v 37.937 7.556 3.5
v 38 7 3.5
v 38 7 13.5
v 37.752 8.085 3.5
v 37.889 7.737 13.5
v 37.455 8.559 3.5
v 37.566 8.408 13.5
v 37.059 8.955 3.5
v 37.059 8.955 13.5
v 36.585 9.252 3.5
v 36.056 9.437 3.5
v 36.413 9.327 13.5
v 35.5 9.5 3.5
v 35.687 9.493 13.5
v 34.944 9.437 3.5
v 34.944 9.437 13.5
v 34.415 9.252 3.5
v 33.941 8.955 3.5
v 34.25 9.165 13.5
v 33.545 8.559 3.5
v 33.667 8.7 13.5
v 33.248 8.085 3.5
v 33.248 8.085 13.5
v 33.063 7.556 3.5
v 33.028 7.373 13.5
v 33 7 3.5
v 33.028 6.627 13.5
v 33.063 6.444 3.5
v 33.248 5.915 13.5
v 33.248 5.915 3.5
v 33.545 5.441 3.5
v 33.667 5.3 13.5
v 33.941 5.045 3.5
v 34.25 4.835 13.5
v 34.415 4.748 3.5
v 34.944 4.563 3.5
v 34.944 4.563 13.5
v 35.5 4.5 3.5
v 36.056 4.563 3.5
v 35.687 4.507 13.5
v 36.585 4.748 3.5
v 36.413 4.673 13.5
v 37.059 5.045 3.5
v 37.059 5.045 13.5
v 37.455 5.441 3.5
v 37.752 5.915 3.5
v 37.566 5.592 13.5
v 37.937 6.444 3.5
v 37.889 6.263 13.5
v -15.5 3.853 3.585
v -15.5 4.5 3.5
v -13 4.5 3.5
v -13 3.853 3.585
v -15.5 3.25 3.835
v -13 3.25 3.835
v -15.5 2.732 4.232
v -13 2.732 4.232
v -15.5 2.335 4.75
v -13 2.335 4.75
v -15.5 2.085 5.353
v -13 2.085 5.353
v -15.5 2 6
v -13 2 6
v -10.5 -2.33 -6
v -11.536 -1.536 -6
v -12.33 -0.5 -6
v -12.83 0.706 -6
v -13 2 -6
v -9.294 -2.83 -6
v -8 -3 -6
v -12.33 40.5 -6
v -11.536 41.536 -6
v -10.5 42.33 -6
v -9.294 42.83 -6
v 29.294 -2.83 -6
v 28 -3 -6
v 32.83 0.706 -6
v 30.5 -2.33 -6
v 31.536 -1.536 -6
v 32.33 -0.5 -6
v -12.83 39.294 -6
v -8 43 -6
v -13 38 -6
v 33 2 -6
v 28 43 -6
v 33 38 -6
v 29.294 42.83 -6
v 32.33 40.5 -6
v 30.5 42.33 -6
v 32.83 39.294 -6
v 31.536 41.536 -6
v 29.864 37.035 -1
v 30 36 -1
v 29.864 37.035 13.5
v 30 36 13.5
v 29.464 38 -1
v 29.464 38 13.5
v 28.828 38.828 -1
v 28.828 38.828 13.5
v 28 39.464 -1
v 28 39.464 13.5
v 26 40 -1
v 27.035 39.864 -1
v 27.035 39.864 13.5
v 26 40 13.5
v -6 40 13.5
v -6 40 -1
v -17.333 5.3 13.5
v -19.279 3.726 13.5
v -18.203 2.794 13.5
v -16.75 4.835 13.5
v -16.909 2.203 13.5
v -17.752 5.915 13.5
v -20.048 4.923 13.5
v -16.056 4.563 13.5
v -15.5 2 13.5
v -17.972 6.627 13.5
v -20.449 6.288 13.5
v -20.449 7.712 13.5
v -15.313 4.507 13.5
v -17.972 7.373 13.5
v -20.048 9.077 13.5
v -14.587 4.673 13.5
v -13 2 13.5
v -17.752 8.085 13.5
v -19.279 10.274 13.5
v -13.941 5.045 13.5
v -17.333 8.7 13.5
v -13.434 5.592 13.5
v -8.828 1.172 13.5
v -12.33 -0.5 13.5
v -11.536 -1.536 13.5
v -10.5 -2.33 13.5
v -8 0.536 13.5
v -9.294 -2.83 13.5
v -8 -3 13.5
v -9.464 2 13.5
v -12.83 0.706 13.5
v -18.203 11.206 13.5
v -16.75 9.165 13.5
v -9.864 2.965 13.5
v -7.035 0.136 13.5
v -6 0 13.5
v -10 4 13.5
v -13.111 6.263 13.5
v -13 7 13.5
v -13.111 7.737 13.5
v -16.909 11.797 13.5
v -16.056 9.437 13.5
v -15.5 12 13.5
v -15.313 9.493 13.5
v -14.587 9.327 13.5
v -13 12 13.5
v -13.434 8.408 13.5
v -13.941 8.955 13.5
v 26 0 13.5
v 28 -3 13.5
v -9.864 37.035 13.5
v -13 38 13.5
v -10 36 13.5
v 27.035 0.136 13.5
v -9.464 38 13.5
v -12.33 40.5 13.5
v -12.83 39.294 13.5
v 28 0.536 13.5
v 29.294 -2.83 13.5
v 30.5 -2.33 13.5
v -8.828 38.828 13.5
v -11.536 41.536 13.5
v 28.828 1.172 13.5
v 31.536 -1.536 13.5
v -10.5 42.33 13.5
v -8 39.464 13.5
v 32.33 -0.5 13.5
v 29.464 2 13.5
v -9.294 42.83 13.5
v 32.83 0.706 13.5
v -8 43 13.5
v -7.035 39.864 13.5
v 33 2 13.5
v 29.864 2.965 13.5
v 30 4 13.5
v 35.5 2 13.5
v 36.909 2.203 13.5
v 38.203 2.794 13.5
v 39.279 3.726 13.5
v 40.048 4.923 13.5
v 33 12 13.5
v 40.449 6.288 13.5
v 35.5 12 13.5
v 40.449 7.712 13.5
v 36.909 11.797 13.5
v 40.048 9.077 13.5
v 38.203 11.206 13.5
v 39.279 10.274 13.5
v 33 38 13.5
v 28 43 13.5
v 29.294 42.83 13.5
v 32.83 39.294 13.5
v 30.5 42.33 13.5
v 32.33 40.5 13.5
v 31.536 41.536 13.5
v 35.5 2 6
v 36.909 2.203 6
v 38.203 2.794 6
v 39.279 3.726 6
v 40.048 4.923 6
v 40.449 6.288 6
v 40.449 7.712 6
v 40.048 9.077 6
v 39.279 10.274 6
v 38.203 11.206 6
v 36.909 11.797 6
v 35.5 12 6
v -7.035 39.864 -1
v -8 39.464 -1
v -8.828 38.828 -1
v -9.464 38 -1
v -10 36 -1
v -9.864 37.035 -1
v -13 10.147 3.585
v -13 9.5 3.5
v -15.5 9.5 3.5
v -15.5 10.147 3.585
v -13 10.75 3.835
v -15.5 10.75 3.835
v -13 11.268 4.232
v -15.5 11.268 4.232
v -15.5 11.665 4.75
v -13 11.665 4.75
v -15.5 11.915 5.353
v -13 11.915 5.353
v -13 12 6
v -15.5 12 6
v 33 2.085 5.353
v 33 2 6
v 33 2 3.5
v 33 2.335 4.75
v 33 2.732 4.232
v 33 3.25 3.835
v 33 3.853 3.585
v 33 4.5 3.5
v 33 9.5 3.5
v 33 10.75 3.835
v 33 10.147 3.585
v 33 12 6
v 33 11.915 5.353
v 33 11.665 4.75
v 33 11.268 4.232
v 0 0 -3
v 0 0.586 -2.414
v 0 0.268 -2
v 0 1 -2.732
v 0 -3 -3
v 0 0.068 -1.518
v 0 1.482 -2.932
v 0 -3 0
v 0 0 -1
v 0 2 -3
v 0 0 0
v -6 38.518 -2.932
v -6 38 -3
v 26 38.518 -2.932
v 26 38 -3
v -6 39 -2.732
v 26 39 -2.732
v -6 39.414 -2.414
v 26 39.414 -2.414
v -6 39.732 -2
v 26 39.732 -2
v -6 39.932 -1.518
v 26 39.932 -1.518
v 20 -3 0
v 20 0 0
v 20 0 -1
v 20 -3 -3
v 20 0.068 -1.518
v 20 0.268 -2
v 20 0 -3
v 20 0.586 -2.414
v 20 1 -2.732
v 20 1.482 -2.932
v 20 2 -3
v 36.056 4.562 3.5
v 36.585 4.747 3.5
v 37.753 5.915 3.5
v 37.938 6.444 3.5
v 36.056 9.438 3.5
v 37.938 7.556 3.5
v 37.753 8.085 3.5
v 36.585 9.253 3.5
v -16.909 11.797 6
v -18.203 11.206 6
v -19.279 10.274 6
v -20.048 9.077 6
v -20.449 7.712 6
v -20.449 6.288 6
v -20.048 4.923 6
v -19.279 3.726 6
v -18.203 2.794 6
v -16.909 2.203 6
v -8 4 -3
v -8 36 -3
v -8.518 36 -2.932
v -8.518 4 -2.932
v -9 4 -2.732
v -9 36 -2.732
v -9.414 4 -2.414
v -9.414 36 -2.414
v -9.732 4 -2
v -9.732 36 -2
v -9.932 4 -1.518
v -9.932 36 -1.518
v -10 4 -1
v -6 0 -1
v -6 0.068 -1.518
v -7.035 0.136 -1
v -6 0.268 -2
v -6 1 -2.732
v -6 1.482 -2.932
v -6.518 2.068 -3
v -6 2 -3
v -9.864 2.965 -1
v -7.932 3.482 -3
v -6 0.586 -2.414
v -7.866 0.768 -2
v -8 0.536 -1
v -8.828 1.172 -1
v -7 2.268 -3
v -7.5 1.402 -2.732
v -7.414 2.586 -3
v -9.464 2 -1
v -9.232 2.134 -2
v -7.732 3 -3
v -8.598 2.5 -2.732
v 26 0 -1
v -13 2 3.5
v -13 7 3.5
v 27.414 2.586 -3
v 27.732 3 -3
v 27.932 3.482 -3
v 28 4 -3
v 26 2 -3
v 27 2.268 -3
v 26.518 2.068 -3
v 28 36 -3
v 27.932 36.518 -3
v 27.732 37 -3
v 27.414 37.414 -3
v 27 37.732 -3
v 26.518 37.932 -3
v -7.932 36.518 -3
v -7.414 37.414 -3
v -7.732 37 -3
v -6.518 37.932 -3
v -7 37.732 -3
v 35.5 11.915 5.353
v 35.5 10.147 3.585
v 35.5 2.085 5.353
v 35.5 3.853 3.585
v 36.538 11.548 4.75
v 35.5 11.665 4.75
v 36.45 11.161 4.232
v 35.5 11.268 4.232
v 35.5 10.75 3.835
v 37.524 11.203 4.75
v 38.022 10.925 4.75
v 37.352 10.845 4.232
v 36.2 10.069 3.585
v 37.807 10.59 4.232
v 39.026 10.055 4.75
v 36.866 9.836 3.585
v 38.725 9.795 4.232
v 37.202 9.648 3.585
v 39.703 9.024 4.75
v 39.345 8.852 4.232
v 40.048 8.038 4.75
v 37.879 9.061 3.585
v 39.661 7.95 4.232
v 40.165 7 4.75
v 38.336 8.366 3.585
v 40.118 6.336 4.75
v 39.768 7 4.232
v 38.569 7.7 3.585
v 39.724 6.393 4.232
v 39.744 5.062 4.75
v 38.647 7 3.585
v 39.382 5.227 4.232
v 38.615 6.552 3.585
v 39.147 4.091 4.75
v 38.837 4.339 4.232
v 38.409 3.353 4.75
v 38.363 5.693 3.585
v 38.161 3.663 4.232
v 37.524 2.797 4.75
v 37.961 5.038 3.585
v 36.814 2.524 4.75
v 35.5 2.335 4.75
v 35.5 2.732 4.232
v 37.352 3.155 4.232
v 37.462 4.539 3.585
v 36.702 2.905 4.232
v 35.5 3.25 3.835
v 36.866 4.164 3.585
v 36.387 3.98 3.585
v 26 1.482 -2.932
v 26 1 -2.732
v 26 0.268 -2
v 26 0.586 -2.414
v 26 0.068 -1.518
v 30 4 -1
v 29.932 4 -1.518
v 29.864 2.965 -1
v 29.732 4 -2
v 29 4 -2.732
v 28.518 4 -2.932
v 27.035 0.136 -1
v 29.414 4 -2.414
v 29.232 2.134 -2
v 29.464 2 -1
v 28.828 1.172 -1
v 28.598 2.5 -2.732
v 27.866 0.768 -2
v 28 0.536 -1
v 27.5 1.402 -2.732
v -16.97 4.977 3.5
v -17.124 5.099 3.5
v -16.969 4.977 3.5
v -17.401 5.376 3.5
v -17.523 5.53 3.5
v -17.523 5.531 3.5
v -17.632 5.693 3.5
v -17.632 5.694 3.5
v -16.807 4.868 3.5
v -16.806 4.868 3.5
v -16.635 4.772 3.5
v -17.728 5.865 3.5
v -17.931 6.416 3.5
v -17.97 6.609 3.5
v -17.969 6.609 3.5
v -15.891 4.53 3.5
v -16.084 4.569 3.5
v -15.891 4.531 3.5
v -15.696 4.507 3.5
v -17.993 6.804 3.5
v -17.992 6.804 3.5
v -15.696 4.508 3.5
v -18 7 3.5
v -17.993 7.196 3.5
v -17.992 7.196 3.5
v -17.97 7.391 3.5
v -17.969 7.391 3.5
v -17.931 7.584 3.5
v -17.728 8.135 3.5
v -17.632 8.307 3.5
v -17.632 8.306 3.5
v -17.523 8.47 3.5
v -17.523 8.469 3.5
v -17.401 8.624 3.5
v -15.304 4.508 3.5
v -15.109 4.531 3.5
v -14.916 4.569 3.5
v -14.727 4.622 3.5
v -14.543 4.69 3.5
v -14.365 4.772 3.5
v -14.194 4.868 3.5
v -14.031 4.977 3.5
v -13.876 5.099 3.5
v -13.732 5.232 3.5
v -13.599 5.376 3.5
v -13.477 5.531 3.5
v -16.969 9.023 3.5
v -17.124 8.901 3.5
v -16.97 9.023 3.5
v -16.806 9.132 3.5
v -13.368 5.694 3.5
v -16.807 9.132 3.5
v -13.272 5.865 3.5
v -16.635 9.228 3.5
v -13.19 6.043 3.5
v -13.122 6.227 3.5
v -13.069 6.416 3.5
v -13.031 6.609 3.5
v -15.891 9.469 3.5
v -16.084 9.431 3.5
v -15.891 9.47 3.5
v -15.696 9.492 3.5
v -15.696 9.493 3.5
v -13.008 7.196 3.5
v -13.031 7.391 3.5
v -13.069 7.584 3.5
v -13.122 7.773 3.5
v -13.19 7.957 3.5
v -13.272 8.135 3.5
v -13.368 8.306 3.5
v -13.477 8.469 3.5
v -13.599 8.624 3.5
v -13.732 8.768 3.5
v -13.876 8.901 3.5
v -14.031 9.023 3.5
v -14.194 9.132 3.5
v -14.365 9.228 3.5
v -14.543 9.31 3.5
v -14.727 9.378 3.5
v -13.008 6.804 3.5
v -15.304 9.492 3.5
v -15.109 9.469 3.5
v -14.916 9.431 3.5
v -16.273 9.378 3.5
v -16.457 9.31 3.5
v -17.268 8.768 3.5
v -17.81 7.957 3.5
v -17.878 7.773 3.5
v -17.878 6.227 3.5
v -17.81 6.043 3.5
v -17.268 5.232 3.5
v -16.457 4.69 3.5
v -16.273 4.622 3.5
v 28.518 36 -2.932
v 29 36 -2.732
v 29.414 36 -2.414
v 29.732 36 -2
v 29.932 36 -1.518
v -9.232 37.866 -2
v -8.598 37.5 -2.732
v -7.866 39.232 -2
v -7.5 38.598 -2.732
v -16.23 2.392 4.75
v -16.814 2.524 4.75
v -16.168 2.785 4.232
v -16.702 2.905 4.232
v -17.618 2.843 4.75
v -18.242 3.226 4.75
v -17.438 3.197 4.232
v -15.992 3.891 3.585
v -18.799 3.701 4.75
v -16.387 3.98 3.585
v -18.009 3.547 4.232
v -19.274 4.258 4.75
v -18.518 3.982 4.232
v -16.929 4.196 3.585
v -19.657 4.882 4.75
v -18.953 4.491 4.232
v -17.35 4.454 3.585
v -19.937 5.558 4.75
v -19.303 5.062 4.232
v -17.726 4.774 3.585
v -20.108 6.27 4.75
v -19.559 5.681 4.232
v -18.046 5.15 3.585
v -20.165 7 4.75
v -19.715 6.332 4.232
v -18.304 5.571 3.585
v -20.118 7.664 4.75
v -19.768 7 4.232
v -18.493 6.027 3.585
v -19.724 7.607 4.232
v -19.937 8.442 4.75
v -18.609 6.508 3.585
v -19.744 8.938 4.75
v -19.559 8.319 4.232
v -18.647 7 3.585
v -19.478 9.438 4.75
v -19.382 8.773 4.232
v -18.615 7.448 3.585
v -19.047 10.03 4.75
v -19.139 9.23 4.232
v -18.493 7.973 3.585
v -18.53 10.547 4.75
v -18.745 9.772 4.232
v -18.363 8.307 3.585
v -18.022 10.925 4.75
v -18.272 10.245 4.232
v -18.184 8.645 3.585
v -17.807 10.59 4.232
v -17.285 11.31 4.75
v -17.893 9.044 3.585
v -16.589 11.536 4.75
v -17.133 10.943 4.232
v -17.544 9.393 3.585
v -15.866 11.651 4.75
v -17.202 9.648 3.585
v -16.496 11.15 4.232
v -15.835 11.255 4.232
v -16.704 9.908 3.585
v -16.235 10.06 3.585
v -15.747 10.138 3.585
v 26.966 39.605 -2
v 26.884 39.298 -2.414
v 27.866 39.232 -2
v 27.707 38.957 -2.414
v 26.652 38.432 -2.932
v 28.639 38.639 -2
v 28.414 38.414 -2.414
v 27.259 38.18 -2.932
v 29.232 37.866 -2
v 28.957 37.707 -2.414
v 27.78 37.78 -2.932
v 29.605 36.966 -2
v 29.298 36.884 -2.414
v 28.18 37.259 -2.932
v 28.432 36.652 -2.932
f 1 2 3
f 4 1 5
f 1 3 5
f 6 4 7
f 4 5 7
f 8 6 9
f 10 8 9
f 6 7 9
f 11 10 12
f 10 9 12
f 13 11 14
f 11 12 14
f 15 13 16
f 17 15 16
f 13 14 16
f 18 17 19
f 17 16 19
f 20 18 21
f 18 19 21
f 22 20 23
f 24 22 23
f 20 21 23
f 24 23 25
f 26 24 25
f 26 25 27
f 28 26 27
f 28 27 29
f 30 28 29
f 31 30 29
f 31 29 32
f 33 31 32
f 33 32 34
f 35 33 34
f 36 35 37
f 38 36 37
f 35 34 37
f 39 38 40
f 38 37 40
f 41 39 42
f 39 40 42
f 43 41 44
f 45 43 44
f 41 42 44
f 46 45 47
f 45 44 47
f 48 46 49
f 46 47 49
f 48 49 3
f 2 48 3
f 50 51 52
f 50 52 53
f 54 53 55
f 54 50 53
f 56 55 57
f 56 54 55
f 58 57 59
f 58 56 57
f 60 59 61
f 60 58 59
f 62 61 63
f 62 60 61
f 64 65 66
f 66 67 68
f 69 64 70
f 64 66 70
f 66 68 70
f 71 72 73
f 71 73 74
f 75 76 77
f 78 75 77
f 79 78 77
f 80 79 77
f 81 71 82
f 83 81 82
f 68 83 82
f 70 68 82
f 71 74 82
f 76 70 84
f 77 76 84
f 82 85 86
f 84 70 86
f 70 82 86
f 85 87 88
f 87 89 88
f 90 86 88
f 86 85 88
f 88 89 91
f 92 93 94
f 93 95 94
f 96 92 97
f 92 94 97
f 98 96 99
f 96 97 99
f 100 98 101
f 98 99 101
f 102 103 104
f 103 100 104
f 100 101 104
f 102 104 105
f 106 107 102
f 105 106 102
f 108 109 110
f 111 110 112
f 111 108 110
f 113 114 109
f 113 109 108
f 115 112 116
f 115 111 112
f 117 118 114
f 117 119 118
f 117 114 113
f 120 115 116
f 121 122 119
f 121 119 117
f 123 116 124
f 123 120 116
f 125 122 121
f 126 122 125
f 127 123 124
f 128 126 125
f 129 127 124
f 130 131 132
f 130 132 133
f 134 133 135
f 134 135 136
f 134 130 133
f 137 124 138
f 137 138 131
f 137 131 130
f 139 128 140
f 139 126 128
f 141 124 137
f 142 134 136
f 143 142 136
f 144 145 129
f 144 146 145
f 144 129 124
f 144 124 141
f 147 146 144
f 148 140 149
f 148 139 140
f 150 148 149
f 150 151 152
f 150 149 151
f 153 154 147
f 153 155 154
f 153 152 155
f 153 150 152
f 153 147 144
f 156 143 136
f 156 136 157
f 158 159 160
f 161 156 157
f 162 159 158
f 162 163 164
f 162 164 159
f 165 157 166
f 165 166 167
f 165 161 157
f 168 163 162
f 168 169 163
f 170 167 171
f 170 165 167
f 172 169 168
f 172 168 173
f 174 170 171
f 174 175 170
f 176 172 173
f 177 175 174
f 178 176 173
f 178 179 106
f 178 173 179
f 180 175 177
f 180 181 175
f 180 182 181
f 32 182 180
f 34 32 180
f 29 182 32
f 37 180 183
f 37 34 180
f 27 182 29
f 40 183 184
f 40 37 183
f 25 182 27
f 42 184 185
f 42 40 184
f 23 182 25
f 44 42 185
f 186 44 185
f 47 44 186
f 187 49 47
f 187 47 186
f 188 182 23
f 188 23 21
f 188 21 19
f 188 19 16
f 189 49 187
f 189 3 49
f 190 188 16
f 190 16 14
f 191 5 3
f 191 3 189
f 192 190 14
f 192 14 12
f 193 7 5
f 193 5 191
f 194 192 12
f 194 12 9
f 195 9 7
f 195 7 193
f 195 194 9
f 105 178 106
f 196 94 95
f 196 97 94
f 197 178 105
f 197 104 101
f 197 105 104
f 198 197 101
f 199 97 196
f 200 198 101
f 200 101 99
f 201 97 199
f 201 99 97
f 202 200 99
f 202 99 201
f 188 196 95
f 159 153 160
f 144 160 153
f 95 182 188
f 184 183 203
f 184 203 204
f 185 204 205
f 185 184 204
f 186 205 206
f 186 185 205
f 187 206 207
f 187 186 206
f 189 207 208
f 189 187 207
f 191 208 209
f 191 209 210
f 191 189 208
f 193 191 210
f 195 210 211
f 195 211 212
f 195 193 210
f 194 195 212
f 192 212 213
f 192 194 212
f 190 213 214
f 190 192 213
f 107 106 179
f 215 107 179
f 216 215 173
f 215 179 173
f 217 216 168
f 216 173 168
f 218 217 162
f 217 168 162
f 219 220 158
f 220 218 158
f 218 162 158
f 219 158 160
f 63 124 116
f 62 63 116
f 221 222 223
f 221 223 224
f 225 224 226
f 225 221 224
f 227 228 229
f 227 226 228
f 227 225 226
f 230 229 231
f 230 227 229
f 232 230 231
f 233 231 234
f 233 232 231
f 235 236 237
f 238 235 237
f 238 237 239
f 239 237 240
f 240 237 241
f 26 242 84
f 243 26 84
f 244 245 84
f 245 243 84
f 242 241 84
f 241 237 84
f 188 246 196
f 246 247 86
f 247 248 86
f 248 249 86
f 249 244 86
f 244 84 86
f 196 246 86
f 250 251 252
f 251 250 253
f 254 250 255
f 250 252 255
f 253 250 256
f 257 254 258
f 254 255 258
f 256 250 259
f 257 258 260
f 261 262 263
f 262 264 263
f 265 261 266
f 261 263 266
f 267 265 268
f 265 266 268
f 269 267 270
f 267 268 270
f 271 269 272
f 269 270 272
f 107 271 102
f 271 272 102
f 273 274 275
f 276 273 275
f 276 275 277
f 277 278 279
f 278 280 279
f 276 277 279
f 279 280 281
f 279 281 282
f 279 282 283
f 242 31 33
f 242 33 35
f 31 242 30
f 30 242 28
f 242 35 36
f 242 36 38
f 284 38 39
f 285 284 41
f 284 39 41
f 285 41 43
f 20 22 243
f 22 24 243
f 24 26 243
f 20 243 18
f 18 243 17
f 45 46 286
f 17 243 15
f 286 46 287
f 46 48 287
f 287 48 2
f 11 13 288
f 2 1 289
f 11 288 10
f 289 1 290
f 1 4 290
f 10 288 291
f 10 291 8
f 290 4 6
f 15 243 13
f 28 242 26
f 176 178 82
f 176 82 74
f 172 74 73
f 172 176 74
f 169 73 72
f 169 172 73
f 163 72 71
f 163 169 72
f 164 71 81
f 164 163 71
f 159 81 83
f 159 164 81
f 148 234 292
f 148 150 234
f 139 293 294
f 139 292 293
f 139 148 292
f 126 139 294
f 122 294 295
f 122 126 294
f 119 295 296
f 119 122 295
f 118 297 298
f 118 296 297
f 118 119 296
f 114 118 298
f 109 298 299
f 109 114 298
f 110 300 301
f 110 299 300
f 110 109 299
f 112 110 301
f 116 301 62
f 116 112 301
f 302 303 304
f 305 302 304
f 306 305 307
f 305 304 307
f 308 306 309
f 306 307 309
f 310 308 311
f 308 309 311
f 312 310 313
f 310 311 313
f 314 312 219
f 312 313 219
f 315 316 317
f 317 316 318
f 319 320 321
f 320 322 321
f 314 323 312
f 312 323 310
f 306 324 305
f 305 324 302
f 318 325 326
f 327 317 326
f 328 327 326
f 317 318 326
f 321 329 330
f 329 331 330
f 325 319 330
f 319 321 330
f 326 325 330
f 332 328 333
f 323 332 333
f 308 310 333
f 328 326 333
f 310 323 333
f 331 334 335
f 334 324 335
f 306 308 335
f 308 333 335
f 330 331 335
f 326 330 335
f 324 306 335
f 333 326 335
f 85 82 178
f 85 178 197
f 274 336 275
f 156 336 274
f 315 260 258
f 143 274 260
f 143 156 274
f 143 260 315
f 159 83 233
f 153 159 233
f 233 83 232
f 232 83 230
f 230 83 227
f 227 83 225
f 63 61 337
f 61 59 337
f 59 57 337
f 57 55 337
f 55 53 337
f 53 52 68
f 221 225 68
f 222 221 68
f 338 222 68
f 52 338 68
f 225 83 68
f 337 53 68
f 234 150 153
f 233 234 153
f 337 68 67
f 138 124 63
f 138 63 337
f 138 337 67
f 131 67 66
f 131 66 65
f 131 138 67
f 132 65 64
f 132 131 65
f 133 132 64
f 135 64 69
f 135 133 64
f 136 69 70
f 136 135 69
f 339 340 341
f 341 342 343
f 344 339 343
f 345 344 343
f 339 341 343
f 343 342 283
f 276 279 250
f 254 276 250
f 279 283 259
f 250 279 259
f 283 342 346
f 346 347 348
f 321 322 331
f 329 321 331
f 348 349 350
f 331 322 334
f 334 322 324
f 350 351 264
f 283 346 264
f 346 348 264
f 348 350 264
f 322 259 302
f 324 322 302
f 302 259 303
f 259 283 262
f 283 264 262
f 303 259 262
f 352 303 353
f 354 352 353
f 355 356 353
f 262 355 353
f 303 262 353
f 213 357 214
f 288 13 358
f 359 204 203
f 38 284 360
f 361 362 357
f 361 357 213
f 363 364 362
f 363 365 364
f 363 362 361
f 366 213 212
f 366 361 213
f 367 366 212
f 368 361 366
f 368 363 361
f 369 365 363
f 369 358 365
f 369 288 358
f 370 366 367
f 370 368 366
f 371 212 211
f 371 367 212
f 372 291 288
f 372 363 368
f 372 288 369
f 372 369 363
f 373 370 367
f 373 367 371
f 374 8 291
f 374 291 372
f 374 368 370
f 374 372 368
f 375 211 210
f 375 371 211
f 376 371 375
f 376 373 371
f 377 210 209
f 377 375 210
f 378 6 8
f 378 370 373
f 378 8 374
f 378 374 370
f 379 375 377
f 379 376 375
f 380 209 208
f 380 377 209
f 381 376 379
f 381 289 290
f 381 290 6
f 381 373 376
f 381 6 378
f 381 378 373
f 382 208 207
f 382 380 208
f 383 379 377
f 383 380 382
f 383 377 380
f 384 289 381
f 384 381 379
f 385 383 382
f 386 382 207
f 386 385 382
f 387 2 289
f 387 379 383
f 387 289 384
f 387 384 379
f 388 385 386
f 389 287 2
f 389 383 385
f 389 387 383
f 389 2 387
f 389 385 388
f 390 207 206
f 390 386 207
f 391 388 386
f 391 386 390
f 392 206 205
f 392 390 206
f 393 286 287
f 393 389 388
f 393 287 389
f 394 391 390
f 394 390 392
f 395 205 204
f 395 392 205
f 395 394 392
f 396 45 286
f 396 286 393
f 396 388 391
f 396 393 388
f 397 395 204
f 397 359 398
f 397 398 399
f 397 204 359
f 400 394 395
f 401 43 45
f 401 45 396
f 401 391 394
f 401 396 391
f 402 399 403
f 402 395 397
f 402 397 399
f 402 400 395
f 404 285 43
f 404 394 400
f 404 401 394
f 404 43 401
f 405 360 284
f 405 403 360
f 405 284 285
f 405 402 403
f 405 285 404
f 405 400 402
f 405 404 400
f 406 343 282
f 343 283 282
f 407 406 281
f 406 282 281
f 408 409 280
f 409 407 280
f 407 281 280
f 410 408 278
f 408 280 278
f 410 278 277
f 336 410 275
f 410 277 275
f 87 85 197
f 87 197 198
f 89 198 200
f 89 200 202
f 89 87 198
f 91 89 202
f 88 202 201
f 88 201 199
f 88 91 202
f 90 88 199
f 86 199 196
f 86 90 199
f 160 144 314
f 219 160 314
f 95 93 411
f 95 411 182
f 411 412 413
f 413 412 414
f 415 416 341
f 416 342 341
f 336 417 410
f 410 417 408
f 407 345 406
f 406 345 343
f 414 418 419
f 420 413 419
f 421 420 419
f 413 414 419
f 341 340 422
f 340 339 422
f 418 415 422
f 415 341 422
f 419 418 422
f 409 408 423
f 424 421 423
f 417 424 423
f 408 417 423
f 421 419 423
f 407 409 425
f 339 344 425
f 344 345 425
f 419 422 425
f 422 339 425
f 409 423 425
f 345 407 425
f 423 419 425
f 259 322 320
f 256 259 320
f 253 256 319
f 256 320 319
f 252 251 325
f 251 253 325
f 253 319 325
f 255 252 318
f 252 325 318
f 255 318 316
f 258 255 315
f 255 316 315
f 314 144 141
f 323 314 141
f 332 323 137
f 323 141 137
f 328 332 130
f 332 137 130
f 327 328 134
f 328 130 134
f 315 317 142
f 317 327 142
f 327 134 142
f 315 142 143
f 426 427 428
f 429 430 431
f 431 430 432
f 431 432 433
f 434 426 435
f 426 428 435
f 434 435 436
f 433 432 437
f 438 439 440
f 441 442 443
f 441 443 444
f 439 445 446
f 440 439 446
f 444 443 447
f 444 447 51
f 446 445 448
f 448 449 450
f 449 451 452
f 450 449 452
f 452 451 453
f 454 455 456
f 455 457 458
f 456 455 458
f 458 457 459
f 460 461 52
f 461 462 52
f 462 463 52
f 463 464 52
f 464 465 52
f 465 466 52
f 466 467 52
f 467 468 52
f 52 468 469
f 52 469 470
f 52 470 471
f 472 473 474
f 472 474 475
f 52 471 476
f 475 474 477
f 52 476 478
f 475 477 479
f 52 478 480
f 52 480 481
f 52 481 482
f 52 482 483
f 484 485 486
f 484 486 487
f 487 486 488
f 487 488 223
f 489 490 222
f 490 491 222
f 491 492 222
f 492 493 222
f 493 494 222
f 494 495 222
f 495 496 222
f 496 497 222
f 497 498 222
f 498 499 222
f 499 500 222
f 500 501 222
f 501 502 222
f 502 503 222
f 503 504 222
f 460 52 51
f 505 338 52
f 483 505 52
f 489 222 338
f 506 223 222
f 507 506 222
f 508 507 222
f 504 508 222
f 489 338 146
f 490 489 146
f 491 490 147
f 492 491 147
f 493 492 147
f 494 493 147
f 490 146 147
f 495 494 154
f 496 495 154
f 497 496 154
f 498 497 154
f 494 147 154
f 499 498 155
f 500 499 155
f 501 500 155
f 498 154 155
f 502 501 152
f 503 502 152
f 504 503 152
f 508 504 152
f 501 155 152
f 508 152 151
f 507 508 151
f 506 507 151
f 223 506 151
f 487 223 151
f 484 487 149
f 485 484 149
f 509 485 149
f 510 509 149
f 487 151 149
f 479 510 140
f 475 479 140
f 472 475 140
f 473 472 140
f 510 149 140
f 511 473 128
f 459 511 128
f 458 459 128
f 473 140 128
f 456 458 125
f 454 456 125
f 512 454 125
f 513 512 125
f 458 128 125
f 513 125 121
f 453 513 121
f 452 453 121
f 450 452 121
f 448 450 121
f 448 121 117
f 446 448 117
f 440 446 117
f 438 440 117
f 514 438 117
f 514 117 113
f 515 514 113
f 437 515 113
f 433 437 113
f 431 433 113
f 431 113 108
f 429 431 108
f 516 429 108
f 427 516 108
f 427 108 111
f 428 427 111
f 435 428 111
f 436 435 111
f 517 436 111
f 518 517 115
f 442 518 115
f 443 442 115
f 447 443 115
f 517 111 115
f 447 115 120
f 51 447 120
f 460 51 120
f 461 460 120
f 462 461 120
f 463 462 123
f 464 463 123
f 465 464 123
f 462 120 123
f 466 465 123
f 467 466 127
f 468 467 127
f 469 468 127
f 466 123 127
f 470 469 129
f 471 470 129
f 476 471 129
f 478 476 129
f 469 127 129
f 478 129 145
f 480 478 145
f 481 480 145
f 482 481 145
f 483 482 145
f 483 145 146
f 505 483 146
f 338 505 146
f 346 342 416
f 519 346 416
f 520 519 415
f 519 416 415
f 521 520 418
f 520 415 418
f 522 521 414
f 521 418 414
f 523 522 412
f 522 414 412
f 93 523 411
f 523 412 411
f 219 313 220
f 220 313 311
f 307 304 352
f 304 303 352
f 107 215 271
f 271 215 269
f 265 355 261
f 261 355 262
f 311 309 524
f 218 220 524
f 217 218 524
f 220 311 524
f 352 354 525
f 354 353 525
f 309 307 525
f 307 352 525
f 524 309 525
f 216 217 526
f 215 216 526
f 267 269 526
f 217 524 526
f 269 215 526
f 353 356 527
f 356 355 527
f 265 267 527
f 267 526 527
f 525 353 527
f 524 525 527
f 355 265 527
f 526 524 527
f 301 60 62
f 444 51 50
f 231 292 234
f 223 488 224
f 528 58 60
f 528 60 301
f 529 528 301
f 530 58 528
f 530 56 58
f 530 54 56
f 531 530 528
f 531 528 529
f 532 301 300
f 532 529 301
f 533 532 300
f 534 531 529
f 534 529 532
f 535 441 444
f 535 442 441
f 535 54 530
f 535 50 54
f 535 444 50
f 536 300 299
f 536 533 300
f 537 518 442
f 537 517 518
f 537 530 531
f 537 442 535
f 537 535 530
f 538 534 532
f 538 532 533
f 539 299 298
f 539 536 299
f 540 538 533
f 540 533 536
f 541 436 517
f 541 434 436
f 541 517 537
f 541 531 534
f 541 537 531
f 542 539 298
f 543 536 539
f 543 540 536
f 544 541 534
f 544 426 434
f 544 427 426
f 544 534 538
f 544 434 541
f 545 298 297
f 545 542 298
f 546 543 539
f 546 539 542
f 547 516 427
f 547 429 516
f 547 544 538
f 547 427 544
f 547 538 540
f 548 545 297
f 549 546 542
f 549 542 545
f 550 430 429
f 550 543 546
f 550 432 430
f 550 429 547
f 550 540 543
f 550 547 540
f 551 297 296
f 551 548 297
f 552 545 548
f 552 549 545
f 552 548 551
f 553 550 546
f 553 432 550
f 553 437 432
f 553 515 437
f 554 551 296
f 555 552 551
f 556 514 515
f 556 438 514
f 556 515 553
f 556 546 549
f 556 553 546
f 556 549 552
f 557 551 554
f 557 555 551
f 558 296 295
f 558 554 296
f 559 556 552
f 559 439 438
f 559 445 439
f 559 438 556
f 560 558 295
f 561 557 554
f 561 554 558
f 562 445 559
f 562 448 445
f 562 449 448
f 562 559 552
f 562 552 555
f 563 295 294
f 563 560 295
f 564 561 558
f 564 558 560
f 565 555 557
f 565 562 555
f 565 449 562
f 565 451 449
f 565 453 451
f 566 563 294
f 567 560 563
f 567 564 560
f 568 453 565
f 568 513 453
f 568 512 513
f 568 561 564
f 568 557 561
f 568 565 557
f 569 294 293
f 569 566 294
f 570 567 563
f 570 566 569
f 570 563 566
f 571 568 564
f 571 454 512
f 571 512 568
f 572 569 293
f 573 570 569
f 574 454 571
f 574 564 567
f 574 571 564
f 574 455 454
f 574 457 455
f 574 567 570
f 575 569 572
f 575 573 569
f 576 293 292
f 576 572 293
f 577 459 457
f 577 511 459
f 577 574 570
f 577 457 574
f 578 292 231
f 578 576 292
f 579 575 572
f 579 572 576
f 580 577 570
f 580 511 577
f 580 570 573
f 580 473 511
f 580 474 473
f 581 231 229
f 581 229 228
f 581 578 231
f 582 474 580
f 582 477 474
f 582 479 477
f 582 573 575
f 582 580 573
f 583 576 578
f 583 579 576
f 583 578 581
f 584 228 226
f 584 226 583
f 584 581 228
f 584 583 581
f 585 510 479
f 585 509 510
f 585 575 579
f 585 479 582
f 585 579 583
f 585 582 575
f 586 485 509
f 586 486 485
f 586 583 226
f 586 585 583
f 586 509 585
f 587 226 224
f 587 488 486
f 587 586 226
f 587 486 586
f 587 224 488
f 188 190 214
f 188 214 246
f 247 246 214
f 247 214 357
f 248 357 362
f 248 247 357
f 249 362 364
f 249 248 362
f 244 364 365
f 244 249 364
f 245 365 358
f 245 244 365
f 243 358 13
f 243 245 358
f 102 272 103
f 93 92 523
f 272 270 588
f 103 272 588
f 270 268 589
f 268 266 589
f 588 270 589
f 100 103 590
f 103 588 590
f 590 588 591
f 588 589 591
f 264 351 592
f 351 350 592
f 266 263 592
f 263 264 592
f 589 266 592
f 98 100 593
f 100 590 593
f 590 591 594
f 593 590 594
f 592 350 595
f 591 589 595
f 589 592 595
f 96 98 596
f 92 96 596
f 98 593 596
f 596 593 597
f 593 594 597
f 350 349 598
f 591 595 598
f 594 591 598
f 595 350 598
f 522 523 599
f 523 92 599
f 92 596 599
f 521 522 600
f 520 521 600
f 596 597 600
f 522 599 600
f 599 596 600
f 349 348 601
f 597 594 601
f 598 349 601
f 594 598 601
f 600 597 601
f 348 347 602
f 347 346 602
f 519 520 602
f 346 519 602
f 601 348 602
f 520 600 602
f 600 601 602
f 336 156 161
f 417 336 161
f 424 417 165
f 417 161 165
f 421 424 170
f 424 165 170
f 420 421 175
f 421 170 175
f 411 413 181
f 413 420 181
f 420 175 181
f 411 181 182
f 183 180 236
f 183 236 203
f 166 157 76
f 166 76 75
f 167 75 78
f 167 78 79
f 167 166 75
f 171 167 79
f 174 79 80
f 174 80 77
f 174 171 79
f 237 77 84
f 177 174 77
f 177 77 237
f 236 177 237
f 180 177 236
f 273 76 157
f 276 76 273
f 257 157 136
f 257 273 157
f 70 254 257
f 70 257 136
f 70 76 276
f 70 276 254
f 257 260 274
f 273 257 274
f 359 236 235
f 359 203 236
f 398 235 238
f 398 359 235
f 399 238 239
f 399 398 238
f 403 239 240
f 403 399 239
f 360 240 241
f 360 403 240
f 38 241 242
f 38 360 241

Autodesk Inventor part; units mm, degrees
ref_plane "YZ Plane" through (0, 0, 0) normal (1, 0, 0) x (0, 1, 0)
ref_plane "XZ Plane" through (0, 0, 0) normal (0, 1, 0) x (-1, 0, 0)
ref_plane "XY Plane" through (0, 0, 0) normal (0, 0, 1) x (1, 0, 0)
sketch "Sketch1" plane through (0, 0, 0) normal (0, 1, 0) x (-1, 0, 0)
  line L0 (0, 0) -> (-20, 0)
  line L1 (-20, 0) -> (-20, -3)
  line L2 (-20, -3) -> (0, -3)
  line L3 (0, -3) -> (0, 0)
  line L4 (3, -6) -> (-23, -6)
  line L5 (-23, -6) -> (-23, 3)
  line L6 (-23, 3) -> (3, 3)
  line L7 (3, 3) -> (3, -6)
  line L8 (-30, -6) -> (-30, 3)
  line L9 (10, 3) -> (10, -6)
  line L10 (3, -6) -> (10, -6)
  line L11 (3, 3) -> (10, 3)
  line L12 (-23, 3) -> (-30, 3)
  line L13 (-23, -6) -> (-30, -6)
  line L14 (10, -6) -> (13, -6)
  line L15 (13, -6) -> (13, 3)
  line L16 (13, 3) -> (10, 3)
  line L17 (-30, 3) -> (-33, 3)
  line L18 (-33, 3) -> (-33, -6)
  line L19 (-33, -6) -> (-30, -6)
  line L20 (0, 0) -> (10, 0)
  line L21 (0, -3) -> (10, -3)
  line L22 (-20, 0) -> (-30, 0)
  line L23 (-20, -3) -> (-30, -3)
  dimension "d0" = 20
  dimension "d1" = 3
  dimension "d2" = 3
  dimension "d6" = 40
  dimension "d7" = 3
  dimension "d8" = 3
extrude "Extrusion1" add sketch "Sketch1" against normal blind 3 contours L20 L7 L21 L3 | L0 L22 L5 L6 L7 L20 | L1 L23 L5 L22 | L21 L7 L4 L5 L23 L2 | L20 L9 L21 L7 | L7 L11 L9 L20 | L22 L8 L12 L5 | L5 L23 L8 L22 | L21 L9 L10 L7 | L9 L16 L15 L14 | L5 L13 L8 L23 | L8 L19 L18 L17
extrude "Extrusion2" add sketch "Sketch1" along normal blind 40 contours L0 L22 L5 L6 L7 L20 | L21 L7 L4 L5 L23 L2 | L7 L11 L9 L20 | L22 L8 L12 L5 | L21 L9 L10 L7 | L9 L16 L15 L14 | L5 L13 L8 L23 | L8 L19 L18 L17
sketch "Sketch2" plane through (0, 40, 0) normal (0, 1, 0) x (1, 0, 0)
  line L0 (33, 6) -> (-13, 6) projected
  line L1 (-13, 6) -> (-13, -3) projected
  line L2 (-13, -3) -> (33, -3) projected
  line L3 (33, -3) -> (33, 6) projected
  line L4 (-10, 3) -> (30, 3) projected
  line L5 (30, 3) -> (30, 0) projected
  line L6 (30, 0) -> (-10, 0) projected
  line L7 (-10, 0) -> (-10, 3) projected
  point P0 (0, 0)
extrude "Extrusion3" add sketch "Sketch2" along normal blind 3 contours L3 L2 L1 L0 | L4 L5 L6 L7
sketch "Sketch3" plane through (-13, -3, 3) normal (0, 0, 1) x (1, 0, 0)
  line L0 (7, 43) -> (39, 43)
  line L1 (43, 39) -> (43, 7)
  line L2 (39, 3) -> (7, 3)
  line L3 (3, 7) -> (3, 39)
  line L4 (0, 46) -> (0, 0) projected
  line L5 (46, 0) -> (0, 0) projected
  line L6 (46, 0) -> (46, 46) projected
  line L7 (0, 46) -> (46, 46) projected
  arc A0 (7, 43) -> (3, 39) centre (7, 39) ccw
  arc A1 (43, 39) -> (39, 43) centre (39, 39) ccw
  arc A2 (39, 3) -> (43, 7) centre (39, 7) ccw
  arc A3 (3, 7) -> (7, 3) centre (7, 7) ccw
  line L8 (43, 3) -> (33, 3) projected
  line L9 (43, 3) -> (39, 3)
  line L10 (43, 3) -> (43, 43) projected
  line L11 (43, 3) -> (43, 7)
  point P0 (13, 3)
  point P1 (3, 43)
  point P2 (3, 3)
  dimension "d13" = 40
  dimension "d14" = 40
  dimension "d15" = 3
  dimension "d16" = 3
  dimension "d21" = 4
extrude "Extrusion4" cut sketch "Sketch3" against normal blind 3 contours L0 A1 L1 A2 L2 A3 L3 A0
extrude "Extrusion6" add sketch "Sketch3" against normal blind 8 contours L10 L8 A2 | L7 L6 L5 L4
extrude "Extrusion7" add sketch "Sketch3" along normal blind 10.5 contours L10 L8 A2 | L7 L6 L5 L4
extrude "Extrusion8" cut sketch "Sketch1" against normal blind 10.5 contours L3 L2 L1 L0
fillet "Fillet1" radius 5 4 edges at (-13, 43, 3.75) (33, 43, 3.75) (-13, -3, 3.75) (33, -3, 3.75)
sketch "Sketch4" plane through (-13, -3, 13.5) normal (0, 0, 1) x (1, 0, 0)
  arc A0 (41, 0) -> (46, 5) centre (41, 5) ccw projected
  line L0 (46, 5) -> (46, 41) projected
  arc A1 (46, 41) -> (41, 46) centre (41, 41) ccw projected
  line L1 (41, 46) -> (5, 46) projected
  arc A2 (5, 46) -> (0, 41) centre (5, 41) ccw projected
  line L2 (0, 41) -> (0, 5) projected
  arc A3 (0, 5) -> (5, 0) centre (5, 5) ccw projected
  line L3 (5, 0) -> (41, 0) projected
  line L4 (7, 43) -> (39, 43) projected
  arc A4 (43, 39) -> (39, 43) centre (39, 39) ccw projected
  line L5 (43, 39) -> (43, 7) projected
  arc A5 (39, 3) -> (43, 7) centre (39, 7) ccw projected
  line L6 (39, 3) -> (7, 3) projected
  arc A6 (3, 7) -> (7, 3) centre (7, 7) ccw projected
  line L7 (3, 7) -> (3, 39) projected
  arc A7 (7, 43) -> (3, 39) centre (7, 39) ccw projected
  arc A8 (0, 5) -> (5, 0) centre (5, 5) ccw projected
  line L8 (0, 5) -> (-2.5, 5)
  line L9 (-7.5, 10) -> (-7.5, 10)
  line L10 (-2.5, 15) -> (0, 15)
  arc A9 (-2.5, 15) -> (-7.5, 10) centre (-2.5, 10) ccw
  arc A10 (-7.5, 10) -> (-2.5, 5) centre (-2.5, 10) ccw
  line L11 (46, 5) -> (48.5, 5)
  line L12 (53.5, 10) -> (53.5, 10)
  line L13 (48.5, 15) -> (46, 15)
  line L14 (46, 15) -> (46, 5)
  circle A11 centre (48.5, 10) radius 2.5
  arc A12 (53.5, 10) -> (48.5, 15) centre (48.5, 10) ccw
  arc A13 (48.5, 5) -> (53.5, 10) centre (48.5, 10) ccw
  circle A14 centre (-2.5, 10) radius 2.5
  point P0 (13, 3)
  point P1 (-7.5, 5)
  point P2 (-7.5, 15)
  point P3 (-7.5, 10)
  point P4 (53.5, 15)
  point P5 (53.5, 5)
  point P6 (53.5, 10)
  point P7 (46, 10)
  point P8 (-7.5, 10)
  point P9 (0, 10)
  dimension "d29" = 7.5
  dimension "d30" = 10
  dimension "d33" = 5
  dimension "d34" = 7.5
  dimension "d35" = 10
  dimension "d36" = 5
  dimension "d37" = 5
  dimension "d38" = 5
  dimension "d41" = 5
extrude "Extrusion9" add sketch "Sketch4" against normal blind 10 contours L0 L13 A12 A13 L11 | L8 A10 A9 L10 L2
fillet "Fillet2" radius 2 3 edges at (-10, 20, -3) (10, 40, -3) (30, 20, -3)
fillet "Fillet4" radius 2.5 6 edges at (34.25, 2, 3.5) (34.25, 12, 3.5) (40.5, 7, 3.5) (-14.25, 12, 3.5) (-14.25, 2, 3.5) (-20.5, 7, 3.5)
properties part number "FANHOLDER_3DPrint"
